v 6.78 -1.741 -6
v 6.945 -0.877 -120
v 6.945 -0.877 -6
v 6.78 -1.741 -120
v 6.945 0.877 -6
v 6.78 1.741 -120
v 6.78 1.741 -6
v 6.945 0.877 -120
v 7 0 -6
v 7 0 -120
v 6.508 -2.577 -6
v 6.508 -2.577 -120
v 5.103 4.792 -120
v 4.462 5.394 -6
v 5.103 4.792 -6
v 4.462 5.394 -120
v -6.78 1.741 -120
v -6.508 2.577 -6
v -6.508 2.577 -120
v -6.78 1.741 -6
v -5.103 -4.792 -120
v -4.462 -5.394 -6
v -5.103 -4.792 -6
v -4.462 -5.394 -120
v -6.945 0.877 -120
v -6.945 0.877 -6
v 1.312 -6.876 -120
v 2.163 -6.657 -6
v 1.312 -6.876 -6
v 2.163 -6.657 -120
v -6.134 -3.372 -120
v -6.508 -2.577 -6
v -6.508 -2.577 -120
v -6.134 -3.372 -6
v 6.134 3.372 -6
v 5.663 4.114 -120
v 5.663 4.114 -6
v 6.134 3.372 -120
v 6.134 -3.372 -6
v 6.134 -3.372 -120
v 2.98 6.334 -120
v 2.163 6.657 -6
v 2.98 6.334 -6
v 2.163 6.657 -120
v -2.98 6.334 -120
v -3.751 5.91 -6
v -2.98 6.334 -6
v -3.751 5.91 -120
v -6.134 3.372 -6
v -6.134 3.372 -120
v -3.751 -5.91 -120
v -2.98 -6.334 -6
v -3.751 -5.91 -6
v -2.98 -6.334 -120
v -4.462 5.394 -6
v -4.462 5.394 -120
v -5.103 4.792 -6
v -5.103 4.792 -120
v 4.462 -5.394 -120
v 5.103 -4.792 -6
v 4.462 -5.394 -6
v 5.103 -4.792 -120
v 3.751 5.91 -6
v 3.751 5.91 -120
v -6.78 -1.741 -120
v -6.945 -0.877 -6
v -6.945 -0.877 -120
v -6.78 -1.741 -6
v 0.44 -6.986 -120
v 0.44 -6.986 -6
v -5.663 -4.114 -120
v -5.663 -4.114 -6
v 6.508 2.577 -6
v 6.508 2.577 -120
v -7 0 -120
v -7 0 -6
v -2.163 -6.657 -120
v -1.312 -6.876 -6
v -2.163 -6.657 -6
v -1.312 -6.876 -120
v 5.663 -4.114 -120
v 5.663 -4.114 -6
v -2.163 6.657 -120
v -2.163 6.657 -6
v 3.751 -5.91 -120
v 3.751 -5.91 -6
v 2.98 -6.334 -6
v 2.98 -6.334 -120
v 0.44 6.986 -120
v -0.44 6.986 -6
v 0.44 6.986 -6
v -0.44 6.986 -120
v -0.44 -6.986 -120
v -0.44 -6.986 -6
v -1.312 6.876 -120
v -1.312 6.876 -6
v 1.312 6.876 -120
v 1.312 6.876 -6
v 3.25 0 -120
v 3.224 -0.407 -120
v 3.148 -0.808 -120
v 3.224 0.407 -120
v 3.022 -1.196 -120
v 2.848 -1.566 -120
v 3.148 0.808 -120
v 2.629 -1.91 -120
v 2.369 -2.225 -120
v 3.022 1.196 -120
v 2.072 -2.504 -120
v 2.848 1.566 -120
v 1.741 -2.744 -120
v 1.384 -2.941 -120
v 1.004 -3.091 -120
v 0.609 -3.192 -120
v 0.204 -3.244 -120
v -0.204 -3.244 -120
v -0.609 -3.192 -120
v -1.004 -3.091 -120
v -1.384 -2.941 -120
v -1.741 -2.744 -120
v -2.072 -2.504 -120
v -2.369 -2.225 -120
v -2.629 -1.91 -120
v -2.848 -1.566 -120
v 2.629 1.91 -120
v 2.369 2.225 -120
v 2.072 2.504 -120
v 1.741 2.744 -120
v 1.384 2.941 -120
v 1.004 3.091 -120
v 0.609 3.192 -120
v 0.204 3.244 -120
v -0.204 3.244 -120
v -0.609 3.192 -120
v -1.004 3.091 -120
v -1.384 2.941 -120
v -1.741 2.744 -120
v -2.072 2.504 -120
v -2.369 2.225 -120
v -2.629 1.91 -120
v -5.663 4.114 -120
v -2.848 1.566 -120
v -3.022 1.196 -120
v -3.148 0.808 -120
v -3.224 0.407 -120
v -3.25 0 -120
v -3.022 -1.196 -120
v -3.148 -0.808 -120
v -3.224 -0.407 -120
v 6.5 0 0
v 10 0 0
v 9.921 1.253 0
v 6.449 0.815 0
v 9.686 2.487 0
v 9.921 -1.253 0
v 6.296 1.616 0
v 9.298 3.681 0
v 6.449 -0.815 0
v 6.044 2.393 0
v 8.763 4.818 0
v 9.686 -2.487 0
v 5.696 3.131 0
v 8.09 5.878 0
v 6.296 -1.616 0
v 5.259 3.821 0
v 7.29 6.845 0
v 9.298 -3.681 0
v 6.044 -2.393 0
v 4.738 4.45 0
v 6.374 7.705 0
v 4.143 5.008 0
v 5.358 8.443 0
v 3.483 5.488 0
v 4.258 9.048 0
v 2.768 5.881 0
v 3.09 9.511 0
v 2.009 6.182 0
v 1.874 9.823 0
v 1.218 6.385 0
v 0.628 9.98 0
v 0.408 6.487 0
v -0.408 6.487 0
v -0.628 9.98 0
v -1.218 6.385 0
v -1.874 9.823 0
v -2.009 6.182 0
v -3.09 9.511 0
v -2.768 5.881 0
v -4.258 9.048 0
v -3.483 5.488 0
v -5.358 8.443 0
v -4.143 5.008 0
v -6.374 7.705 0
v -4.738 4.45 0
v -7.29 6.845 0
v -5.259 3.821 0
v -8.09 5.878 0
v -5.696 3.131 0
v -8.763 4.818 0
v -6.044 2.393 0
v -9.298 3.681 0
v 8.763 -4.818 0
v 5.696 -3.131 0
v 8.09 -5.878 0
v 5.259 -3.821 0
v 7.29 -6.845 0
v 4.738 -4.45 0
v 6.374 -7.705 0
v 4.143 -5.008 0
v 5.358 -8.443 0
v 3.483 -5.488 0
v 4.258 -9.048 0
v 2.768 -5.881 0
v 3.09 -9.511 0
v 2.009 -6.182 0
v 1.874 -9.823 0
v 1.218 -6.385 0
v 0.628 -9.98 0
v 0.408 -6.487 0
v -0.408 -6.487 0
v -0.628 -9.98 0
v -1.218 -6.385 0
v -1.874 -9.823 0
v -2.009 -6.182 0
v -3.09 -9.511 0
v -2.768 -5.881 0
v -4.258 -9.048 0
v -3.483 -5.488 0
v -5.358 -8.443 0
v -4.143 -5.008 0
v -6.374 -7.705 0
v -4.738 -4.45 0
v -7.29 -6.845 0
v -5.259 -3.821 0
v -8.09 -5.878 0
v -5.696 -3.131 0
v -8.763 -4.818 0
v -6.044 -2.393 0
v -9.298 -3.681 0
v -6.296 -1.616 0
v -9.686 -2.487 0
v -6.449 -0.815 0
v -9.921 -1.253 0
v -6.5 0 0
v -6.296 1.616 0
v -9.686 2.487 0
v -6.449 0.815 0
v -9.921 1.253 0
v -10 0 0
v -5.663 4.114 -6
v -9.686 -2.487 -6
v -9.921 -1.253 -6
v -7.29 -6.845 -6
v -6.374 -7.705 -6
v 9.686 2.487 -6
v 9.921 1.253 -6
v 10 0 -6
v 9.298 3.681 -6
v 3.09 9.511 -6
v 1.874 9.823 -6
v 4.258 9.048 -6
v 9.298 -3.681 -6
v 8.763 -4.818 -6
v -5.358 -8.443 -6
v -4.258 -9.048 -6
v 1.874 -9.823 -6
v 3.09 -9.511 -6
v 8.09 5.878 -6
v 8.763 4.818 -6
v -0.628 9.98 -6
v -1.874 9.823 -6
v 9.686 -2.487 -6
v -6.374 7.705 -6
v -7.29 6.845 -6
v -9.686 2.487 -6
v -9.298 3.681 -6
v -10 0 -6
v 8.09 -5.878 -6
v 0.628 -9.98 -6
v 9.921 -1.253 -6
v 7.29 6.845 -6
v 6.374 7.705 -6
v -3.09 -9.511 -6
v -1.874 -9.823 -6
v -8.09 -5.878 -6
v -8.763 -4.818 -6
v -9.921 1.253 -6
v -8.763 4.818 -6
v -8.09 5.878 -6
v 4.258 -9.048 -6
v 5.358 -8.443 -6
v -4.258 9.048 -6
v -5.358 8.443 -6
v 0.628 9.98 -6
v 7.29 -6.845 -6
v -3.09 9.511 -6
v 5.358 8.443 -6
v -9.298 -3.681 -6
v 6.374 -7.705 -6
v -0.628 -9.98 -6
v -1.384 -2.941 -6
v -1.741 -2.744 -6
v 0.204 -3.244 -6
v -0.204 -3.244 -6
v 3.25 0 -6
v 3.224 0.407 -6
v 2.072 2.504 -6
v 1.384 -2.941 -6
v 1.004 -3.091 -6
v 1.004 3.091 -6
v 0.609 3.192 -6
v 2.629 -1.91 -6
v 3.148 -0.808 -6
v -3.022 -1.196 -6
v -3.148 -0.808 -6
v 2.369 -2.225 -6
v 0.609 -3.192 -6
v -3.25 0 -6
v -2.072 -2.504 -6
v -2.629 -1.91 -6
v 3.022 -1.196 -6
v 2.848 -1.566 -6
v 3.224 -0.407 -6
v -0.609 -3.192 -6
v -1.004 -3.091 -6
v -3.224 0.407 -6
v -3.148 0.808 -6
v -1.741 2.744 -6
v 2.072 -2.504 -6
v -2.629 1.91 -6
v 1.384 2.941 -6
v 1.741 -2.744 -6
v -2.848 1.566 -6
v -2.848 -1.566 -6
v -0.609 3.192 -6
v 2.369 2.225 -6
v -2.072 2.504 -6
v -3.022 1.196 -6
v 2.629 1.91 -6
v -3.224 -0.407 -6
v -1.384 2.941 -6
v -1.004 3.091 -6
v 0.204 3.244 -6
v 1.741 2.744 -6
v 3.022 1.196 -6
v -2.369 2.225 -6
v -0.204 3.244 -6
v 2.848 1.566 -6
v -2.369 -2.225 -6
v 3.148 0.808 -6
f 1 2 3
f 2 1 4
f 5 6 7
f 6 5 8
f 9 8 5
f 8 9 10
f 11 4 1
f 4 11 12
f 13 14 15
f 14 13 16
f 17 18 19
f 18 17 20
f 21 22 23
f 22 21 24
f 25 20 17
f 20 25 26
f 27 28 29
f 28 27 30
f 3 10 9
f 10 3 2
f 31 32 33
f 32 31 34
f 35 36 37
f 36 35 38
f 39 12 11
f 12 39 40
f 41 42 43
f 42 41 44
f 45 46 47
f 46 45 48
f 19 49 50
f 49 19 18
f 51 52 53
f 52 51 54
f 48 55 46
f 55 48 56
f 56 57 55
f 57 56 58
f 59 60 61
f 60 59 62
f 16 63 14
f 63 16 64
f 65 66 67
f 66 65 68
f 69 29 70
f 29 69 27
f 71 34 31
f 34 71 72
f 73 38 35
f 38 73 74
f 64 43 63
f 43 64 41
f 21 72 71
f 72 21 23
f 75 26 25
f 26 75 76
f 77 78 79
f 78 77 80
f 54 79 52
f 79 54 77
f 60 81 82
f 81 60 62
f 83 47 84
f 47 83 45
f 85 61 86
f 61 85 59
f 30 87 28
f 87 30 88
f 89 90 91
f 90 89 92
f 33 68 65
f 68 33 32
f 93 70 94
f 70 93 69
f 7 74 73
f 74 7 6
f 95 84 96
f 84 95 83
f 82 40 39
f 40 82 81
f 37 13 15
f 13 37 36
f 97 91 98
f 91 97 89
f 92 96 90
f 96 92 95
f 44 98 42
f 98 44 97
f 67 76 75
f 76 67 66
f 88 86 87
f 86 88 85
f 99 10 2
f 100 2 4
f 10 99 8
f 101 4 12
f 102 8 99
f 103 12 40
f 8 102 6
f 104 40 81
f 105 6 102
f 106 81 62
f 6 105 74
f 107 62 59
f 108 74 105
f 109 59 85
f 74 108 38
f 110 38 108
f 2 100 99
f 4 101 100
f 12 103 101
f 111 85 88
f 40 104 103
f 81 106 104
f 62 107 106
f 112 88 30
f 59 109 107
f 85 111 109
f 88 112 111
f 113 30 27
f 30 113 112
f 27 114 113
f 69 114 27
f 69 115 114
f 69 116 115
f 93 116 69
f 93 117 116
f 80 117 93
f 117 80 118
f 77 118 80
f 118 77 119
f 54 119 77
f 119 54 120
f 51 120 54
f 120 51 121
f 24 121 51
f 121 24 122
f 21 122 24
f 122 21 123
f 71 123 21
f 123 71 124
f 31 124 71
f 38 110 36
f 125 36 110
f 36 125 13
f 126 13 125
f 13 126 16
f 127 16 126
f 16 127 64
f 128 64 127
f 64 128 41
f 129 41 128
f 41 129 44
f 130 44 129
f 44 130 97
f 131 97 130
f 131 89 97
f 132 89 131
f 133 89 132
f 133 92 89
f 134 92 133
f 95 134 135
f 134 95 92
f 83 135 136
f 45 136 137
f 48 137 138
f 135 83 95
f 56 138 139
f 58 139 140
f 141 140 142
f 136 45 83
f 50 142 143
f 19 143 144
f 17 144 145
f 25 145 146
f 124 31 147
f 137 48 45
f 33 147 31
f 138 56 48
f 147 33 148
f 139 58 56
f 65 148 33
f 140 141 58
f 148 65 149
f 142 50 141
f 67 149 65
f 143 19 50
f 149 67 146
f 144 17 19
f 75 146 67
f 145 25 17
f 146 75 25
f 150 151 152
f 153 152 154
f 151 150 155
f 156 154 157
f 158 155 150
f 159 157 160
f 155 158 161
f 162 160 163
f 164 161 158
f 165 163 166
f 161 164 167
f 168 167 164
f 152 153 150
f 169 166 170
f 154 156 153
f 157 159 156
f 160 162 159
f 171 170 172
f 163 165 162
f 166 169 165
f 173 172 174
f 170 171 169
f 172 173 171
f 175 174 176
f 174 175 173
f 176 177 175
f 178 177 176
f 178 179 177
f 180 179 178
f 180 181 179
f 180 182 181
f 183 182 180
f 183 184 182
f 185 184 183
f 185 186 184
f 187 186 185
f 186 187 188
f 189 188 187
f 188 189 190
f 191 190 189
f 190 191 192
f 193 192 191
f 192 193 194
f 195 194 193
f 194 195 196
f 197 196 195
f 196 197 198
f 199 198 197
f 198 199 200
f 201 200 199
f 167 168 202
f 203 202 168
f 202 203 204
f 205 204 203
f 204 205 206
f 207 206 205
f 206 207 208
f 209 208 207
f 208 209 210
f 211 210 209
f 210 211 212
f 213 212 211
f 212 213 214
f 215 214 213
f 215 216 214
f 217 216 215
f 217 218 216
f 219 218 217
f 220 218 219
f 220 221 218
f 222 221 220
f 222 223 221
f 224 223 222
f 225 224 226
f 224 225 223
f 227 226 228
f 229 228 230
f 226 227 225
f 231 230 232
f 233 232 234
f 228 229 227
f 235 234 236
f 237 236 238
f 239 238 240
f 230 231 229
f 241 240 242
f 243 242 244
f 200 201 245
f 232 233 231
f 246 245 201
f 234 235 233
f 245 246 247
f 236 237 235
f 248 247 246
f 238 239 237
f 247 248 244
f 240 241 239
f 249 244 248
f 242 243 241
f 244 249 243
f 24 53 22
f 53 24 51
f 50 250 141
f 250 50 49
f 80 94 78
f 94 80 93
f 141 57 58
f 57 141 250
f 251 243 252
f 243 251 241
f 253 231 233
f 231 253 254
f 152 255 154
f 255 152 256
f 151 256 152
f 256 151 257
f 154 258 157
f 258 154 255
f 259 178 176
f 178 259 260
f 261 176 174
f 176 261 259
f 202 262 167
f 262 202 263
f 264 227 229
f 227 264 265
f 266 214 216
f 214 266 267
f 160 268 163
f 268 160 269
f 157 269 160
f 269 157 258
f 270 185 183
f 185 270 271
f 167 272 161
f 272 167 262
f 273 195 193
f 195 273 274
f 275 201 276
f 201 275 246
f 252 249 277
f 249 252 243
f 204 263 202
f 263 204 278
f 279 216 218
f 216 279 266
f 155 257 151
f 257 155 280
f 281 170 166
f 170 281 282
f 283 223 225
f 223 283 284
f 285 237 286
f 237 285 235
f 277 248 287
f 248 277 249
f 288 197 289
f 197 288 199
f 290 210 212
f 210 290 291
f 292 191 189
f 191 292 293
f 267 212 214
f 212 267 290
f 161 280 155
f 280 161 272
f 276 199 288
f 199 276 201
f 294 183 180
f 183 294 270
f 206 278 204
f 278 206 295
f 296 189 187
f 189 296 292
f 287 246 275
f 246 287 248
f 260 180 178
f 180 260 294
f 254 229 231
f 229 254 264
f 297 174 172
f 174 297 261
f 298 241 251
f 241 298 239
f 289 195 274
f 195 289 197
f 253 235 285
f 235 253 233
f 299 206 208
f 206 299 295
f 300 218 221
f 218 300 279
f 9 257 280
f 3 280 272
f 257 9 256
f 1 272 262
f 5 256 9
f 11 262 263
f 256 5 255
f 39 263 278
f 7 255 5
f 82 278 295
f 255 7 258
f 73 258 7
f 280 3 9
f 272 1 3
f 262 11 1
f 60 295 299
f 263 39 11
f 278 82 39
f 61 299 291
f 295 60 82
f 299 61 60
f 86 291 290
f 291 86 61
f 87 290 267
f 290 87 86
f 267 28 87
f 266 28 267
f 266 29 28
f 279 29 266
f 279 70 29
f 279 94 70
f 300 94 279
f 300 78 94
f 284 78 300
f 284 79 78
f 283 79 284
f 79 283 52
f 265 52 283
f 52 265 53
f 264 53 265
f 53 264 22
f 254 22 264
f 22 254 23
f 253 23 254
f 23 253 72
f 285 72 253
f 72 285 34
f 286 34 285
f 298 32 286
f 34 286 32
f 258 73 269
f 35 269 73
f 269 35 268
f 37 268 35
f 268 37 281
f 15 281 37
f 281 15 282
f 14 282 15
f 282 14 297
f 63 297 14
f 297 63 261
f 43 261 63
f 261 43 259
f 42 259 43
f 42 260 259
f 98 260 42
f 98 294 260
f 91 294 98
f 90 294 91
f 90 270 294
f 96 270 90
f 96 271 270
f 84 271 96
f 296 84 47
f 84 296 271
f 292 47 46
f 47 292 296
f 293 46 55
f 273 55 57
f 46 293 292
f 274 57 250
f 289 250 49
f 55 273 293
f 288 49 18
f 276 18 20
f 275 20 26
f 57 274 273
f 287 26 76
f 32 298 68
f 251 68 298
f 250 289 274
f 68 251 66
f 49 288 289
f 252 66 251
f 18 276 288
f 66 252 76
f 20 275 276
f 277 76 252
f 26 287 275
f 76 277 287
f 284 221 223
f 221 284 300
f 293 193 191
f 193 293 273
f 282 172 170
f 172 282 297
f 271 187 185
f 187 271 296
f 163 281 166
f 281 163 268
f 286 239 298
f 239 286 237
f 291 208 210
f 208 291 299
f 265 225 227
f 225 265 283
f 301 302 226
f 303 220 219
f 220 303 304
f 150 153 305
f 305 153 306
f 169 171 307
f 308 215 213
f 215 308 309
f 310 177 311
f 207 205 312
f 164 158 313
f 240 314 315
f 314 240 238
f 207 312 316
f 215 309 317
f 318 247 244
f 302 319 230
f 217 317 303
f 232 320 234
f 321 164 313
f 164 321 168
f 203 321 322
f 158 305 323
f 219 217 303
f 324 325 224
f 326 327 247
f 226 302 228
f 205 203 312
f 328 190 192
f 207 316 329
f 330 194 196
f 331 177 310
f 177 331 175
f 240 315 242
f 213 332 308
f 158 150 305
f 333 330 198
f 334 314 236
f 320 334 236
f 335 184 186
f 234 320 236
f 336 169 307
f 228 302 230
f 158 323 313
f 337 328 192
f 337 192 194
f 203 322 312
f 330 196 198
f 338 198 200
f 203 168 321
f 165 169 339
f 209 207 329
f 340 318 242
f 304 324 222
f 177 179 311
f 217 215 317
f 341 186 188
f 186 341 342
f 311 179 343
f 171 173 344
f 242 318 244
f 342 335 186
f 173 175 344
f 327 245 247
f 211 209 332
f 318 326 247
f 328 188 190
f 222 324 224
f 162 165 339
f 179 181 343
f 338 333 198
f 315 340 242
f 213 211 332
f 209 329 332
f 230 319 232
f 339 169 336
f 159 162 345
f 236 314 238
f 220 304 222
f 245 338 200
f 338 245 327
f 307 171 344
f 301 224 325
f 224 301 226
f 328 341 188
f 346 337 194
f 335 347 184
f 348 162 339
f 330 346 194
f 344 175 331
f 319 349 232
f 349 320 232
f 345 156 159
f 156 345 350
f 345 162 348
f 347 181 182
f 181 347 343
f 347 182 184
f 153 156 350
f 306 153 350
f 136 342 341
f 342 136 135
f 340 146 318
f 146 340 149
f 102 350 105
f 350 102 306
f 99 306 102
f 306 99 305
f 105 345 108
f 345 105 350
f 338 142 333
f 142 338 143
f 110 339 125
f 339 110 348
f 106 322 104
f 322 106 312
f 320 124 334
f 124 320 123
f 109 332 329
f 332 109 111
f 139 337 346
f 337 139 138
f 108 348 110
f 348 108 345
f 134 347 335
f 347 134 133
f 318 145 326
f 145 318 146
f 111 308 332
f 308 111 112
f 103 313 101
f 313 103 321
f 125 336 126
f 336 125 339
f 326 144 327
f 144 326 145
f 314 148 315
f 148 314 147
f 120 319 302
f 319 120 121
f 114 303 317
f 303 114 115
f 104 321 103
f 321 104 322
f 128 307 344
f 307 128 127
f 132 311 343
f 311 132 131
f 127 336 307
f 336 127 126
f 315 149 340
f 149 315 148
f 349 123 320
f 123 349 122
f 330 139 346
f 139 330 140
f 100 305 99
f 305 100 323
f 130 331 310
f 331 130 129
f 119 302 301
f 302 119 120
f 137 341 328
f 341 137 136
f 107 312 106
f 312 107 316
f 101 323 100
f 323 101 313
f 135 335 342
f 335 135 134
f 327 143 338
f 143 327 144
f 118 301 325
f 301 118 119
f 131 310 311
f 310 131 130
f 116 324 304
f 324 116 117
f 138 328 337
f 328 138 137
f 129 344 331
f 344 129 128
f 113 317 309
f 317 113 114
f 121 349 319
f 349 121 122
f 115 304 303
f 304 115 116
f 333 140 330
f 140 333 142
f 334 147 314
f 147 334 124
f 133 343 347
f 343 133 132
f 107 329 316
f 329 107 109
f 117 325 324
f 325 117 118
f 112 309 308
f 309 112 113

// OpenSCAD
$fn = 50;


difference() {
	union() {
		translate(v = [0, 0, -120.0000000000]) {
			cylinder(h = 120, r = 7.0000000000);
		}
		translate(v = [0, 0, -6.0000000000]) {
			cylinder(h = 6, r = 10.0000000000);
		}
	}
	union() {
		translate(v = [0, 0, 0]) {
			rotate(a = [0, 0, 0]) {
				difference() {
					union() {
						#translate(v = [0, 0, -120.0000000000]) {
							cylinder(h = 120, r = 2.2500000000);
						}
						#translate(v = [0, 0, -6]) {
							cylinder(h = 6, r = 7.0000000000, r1 = 3.2500000000, r2 = 6.5000000000);
						}
						#translate(v = [0, 0, -120.0000000000]) {
							cylinder(h = 120, r = 3.2500000000);
						}
						#translate(v = [0, 0, -120.0000000000]) {
							cylinder(h = 120, r = 2.2500000000);
						}
					}
					union();
				}
			}
		}
	}
}
